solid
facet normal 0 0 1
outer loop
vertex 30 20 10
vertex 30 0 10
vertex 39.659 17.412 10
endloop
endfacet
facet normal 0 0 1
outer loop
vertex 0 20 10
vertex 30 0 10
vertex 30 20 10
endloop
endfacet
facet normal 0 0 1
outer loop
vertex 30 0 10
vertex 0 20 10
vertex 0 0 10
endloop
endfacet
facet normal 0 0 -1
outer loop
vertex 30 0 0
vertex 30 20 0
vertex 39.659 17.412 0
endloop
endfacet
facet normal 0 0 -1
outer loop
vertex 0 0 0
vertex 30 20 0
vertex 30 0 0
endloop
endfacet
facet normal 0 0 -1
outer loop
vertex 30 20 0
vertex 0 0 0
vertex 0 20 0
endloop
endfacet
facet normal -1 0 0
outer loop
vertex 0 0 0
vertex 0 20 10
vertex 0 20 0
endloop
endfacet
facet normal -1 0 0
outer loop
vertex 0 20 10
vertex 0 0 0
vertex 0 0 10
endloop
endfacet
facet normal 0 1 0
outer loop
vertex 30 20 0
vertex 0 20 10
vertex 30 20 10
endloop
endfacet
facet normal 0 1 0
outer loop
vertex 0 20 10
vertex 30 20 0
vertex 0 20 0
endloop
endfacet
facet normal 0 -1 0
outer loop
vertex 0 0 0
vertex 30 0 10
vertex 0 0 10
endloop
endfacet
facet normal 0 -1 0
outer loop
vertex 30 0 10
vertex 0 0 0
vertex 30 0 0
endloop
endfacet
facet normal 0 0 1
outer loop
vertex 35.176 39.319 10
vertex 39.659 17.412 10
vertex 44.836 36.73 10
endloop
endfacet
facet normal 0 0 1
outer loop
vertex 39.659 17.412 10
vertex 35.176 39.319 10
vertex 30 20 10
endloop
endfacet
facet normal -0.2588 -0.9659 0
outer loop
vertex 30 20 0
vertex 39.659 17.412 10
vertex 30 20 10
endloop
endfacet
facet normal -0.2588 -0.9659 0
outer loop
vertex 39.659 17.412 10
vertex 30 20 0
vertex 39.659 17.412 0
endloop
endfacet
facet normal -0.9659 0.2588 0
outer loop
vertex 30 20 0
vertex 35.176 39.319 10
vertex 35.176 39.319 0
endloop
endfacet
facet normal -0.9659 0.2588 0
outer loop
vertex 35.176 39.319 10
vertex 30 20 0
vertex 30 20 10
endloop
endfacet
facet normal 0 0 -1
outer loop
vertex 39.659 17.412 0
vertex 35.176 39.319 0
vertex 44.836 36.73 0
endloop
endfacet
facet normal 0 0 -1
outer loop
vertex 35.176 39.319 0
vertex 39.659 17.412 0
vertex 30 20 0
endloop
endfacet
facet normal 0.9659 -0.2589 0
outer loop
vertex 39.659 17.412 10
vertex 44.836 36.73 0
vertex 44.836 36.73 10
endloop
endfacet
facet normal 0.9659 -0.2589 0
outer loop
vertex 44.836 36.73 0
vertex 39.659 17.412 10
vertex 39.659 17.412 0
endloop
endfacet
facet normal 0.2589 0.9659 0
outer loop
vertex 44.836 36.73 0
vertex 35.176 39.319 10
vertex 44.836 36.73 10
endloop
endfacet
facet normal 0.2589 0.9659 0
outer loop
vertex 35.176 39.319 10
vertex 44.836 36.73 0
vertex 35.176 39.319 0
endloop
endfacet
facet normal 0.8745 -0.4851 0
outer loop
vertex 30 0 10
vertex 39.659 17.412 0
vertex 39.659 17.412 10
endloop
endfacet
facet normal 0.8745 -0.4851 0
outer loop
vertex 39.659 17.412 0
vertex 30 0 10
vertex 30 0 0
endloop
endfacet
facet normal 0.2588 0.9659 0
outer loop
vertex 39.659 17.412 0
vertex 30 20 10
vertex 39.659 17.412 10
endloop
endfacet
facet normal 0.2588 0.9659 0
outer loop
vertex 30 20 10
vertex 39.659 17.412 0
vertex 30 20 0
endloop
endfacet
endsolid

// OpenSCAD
module angled_cube(a_len_inner=30,
                   a_width=10,
                   b_len_inner=20,
                   b_width=10,
                   height=10,
                   angle=75)
{
    c_len_outer=sqrt(pow(a_width,2)+pow(b_width,2));
    offset_x_b_outer=sin(angle)*b_width;
    offset_y_b_outer=a_width-tan(90-angle)*offset_x_b_outer;
    echo(offset_x_b_outer);
    echo(offset_y_b_outer);

    cube([a_len_inner,a_width,height]);
    translate([a_len_inner,a_width,0])
        rotate(angle)
            translate([0,-b_width,0])
                cube([b_len_inner,b_width,height]);
            
    translate([a_len_inner,0,0])    
    linear_extrude(height)
        polygon(points=[[0,0],[0,a_width],[offset_x_b_outer,offset_y_b_outer]],
                paths=[[0,1,2]]);
}

angled_cube(a_width=20);
